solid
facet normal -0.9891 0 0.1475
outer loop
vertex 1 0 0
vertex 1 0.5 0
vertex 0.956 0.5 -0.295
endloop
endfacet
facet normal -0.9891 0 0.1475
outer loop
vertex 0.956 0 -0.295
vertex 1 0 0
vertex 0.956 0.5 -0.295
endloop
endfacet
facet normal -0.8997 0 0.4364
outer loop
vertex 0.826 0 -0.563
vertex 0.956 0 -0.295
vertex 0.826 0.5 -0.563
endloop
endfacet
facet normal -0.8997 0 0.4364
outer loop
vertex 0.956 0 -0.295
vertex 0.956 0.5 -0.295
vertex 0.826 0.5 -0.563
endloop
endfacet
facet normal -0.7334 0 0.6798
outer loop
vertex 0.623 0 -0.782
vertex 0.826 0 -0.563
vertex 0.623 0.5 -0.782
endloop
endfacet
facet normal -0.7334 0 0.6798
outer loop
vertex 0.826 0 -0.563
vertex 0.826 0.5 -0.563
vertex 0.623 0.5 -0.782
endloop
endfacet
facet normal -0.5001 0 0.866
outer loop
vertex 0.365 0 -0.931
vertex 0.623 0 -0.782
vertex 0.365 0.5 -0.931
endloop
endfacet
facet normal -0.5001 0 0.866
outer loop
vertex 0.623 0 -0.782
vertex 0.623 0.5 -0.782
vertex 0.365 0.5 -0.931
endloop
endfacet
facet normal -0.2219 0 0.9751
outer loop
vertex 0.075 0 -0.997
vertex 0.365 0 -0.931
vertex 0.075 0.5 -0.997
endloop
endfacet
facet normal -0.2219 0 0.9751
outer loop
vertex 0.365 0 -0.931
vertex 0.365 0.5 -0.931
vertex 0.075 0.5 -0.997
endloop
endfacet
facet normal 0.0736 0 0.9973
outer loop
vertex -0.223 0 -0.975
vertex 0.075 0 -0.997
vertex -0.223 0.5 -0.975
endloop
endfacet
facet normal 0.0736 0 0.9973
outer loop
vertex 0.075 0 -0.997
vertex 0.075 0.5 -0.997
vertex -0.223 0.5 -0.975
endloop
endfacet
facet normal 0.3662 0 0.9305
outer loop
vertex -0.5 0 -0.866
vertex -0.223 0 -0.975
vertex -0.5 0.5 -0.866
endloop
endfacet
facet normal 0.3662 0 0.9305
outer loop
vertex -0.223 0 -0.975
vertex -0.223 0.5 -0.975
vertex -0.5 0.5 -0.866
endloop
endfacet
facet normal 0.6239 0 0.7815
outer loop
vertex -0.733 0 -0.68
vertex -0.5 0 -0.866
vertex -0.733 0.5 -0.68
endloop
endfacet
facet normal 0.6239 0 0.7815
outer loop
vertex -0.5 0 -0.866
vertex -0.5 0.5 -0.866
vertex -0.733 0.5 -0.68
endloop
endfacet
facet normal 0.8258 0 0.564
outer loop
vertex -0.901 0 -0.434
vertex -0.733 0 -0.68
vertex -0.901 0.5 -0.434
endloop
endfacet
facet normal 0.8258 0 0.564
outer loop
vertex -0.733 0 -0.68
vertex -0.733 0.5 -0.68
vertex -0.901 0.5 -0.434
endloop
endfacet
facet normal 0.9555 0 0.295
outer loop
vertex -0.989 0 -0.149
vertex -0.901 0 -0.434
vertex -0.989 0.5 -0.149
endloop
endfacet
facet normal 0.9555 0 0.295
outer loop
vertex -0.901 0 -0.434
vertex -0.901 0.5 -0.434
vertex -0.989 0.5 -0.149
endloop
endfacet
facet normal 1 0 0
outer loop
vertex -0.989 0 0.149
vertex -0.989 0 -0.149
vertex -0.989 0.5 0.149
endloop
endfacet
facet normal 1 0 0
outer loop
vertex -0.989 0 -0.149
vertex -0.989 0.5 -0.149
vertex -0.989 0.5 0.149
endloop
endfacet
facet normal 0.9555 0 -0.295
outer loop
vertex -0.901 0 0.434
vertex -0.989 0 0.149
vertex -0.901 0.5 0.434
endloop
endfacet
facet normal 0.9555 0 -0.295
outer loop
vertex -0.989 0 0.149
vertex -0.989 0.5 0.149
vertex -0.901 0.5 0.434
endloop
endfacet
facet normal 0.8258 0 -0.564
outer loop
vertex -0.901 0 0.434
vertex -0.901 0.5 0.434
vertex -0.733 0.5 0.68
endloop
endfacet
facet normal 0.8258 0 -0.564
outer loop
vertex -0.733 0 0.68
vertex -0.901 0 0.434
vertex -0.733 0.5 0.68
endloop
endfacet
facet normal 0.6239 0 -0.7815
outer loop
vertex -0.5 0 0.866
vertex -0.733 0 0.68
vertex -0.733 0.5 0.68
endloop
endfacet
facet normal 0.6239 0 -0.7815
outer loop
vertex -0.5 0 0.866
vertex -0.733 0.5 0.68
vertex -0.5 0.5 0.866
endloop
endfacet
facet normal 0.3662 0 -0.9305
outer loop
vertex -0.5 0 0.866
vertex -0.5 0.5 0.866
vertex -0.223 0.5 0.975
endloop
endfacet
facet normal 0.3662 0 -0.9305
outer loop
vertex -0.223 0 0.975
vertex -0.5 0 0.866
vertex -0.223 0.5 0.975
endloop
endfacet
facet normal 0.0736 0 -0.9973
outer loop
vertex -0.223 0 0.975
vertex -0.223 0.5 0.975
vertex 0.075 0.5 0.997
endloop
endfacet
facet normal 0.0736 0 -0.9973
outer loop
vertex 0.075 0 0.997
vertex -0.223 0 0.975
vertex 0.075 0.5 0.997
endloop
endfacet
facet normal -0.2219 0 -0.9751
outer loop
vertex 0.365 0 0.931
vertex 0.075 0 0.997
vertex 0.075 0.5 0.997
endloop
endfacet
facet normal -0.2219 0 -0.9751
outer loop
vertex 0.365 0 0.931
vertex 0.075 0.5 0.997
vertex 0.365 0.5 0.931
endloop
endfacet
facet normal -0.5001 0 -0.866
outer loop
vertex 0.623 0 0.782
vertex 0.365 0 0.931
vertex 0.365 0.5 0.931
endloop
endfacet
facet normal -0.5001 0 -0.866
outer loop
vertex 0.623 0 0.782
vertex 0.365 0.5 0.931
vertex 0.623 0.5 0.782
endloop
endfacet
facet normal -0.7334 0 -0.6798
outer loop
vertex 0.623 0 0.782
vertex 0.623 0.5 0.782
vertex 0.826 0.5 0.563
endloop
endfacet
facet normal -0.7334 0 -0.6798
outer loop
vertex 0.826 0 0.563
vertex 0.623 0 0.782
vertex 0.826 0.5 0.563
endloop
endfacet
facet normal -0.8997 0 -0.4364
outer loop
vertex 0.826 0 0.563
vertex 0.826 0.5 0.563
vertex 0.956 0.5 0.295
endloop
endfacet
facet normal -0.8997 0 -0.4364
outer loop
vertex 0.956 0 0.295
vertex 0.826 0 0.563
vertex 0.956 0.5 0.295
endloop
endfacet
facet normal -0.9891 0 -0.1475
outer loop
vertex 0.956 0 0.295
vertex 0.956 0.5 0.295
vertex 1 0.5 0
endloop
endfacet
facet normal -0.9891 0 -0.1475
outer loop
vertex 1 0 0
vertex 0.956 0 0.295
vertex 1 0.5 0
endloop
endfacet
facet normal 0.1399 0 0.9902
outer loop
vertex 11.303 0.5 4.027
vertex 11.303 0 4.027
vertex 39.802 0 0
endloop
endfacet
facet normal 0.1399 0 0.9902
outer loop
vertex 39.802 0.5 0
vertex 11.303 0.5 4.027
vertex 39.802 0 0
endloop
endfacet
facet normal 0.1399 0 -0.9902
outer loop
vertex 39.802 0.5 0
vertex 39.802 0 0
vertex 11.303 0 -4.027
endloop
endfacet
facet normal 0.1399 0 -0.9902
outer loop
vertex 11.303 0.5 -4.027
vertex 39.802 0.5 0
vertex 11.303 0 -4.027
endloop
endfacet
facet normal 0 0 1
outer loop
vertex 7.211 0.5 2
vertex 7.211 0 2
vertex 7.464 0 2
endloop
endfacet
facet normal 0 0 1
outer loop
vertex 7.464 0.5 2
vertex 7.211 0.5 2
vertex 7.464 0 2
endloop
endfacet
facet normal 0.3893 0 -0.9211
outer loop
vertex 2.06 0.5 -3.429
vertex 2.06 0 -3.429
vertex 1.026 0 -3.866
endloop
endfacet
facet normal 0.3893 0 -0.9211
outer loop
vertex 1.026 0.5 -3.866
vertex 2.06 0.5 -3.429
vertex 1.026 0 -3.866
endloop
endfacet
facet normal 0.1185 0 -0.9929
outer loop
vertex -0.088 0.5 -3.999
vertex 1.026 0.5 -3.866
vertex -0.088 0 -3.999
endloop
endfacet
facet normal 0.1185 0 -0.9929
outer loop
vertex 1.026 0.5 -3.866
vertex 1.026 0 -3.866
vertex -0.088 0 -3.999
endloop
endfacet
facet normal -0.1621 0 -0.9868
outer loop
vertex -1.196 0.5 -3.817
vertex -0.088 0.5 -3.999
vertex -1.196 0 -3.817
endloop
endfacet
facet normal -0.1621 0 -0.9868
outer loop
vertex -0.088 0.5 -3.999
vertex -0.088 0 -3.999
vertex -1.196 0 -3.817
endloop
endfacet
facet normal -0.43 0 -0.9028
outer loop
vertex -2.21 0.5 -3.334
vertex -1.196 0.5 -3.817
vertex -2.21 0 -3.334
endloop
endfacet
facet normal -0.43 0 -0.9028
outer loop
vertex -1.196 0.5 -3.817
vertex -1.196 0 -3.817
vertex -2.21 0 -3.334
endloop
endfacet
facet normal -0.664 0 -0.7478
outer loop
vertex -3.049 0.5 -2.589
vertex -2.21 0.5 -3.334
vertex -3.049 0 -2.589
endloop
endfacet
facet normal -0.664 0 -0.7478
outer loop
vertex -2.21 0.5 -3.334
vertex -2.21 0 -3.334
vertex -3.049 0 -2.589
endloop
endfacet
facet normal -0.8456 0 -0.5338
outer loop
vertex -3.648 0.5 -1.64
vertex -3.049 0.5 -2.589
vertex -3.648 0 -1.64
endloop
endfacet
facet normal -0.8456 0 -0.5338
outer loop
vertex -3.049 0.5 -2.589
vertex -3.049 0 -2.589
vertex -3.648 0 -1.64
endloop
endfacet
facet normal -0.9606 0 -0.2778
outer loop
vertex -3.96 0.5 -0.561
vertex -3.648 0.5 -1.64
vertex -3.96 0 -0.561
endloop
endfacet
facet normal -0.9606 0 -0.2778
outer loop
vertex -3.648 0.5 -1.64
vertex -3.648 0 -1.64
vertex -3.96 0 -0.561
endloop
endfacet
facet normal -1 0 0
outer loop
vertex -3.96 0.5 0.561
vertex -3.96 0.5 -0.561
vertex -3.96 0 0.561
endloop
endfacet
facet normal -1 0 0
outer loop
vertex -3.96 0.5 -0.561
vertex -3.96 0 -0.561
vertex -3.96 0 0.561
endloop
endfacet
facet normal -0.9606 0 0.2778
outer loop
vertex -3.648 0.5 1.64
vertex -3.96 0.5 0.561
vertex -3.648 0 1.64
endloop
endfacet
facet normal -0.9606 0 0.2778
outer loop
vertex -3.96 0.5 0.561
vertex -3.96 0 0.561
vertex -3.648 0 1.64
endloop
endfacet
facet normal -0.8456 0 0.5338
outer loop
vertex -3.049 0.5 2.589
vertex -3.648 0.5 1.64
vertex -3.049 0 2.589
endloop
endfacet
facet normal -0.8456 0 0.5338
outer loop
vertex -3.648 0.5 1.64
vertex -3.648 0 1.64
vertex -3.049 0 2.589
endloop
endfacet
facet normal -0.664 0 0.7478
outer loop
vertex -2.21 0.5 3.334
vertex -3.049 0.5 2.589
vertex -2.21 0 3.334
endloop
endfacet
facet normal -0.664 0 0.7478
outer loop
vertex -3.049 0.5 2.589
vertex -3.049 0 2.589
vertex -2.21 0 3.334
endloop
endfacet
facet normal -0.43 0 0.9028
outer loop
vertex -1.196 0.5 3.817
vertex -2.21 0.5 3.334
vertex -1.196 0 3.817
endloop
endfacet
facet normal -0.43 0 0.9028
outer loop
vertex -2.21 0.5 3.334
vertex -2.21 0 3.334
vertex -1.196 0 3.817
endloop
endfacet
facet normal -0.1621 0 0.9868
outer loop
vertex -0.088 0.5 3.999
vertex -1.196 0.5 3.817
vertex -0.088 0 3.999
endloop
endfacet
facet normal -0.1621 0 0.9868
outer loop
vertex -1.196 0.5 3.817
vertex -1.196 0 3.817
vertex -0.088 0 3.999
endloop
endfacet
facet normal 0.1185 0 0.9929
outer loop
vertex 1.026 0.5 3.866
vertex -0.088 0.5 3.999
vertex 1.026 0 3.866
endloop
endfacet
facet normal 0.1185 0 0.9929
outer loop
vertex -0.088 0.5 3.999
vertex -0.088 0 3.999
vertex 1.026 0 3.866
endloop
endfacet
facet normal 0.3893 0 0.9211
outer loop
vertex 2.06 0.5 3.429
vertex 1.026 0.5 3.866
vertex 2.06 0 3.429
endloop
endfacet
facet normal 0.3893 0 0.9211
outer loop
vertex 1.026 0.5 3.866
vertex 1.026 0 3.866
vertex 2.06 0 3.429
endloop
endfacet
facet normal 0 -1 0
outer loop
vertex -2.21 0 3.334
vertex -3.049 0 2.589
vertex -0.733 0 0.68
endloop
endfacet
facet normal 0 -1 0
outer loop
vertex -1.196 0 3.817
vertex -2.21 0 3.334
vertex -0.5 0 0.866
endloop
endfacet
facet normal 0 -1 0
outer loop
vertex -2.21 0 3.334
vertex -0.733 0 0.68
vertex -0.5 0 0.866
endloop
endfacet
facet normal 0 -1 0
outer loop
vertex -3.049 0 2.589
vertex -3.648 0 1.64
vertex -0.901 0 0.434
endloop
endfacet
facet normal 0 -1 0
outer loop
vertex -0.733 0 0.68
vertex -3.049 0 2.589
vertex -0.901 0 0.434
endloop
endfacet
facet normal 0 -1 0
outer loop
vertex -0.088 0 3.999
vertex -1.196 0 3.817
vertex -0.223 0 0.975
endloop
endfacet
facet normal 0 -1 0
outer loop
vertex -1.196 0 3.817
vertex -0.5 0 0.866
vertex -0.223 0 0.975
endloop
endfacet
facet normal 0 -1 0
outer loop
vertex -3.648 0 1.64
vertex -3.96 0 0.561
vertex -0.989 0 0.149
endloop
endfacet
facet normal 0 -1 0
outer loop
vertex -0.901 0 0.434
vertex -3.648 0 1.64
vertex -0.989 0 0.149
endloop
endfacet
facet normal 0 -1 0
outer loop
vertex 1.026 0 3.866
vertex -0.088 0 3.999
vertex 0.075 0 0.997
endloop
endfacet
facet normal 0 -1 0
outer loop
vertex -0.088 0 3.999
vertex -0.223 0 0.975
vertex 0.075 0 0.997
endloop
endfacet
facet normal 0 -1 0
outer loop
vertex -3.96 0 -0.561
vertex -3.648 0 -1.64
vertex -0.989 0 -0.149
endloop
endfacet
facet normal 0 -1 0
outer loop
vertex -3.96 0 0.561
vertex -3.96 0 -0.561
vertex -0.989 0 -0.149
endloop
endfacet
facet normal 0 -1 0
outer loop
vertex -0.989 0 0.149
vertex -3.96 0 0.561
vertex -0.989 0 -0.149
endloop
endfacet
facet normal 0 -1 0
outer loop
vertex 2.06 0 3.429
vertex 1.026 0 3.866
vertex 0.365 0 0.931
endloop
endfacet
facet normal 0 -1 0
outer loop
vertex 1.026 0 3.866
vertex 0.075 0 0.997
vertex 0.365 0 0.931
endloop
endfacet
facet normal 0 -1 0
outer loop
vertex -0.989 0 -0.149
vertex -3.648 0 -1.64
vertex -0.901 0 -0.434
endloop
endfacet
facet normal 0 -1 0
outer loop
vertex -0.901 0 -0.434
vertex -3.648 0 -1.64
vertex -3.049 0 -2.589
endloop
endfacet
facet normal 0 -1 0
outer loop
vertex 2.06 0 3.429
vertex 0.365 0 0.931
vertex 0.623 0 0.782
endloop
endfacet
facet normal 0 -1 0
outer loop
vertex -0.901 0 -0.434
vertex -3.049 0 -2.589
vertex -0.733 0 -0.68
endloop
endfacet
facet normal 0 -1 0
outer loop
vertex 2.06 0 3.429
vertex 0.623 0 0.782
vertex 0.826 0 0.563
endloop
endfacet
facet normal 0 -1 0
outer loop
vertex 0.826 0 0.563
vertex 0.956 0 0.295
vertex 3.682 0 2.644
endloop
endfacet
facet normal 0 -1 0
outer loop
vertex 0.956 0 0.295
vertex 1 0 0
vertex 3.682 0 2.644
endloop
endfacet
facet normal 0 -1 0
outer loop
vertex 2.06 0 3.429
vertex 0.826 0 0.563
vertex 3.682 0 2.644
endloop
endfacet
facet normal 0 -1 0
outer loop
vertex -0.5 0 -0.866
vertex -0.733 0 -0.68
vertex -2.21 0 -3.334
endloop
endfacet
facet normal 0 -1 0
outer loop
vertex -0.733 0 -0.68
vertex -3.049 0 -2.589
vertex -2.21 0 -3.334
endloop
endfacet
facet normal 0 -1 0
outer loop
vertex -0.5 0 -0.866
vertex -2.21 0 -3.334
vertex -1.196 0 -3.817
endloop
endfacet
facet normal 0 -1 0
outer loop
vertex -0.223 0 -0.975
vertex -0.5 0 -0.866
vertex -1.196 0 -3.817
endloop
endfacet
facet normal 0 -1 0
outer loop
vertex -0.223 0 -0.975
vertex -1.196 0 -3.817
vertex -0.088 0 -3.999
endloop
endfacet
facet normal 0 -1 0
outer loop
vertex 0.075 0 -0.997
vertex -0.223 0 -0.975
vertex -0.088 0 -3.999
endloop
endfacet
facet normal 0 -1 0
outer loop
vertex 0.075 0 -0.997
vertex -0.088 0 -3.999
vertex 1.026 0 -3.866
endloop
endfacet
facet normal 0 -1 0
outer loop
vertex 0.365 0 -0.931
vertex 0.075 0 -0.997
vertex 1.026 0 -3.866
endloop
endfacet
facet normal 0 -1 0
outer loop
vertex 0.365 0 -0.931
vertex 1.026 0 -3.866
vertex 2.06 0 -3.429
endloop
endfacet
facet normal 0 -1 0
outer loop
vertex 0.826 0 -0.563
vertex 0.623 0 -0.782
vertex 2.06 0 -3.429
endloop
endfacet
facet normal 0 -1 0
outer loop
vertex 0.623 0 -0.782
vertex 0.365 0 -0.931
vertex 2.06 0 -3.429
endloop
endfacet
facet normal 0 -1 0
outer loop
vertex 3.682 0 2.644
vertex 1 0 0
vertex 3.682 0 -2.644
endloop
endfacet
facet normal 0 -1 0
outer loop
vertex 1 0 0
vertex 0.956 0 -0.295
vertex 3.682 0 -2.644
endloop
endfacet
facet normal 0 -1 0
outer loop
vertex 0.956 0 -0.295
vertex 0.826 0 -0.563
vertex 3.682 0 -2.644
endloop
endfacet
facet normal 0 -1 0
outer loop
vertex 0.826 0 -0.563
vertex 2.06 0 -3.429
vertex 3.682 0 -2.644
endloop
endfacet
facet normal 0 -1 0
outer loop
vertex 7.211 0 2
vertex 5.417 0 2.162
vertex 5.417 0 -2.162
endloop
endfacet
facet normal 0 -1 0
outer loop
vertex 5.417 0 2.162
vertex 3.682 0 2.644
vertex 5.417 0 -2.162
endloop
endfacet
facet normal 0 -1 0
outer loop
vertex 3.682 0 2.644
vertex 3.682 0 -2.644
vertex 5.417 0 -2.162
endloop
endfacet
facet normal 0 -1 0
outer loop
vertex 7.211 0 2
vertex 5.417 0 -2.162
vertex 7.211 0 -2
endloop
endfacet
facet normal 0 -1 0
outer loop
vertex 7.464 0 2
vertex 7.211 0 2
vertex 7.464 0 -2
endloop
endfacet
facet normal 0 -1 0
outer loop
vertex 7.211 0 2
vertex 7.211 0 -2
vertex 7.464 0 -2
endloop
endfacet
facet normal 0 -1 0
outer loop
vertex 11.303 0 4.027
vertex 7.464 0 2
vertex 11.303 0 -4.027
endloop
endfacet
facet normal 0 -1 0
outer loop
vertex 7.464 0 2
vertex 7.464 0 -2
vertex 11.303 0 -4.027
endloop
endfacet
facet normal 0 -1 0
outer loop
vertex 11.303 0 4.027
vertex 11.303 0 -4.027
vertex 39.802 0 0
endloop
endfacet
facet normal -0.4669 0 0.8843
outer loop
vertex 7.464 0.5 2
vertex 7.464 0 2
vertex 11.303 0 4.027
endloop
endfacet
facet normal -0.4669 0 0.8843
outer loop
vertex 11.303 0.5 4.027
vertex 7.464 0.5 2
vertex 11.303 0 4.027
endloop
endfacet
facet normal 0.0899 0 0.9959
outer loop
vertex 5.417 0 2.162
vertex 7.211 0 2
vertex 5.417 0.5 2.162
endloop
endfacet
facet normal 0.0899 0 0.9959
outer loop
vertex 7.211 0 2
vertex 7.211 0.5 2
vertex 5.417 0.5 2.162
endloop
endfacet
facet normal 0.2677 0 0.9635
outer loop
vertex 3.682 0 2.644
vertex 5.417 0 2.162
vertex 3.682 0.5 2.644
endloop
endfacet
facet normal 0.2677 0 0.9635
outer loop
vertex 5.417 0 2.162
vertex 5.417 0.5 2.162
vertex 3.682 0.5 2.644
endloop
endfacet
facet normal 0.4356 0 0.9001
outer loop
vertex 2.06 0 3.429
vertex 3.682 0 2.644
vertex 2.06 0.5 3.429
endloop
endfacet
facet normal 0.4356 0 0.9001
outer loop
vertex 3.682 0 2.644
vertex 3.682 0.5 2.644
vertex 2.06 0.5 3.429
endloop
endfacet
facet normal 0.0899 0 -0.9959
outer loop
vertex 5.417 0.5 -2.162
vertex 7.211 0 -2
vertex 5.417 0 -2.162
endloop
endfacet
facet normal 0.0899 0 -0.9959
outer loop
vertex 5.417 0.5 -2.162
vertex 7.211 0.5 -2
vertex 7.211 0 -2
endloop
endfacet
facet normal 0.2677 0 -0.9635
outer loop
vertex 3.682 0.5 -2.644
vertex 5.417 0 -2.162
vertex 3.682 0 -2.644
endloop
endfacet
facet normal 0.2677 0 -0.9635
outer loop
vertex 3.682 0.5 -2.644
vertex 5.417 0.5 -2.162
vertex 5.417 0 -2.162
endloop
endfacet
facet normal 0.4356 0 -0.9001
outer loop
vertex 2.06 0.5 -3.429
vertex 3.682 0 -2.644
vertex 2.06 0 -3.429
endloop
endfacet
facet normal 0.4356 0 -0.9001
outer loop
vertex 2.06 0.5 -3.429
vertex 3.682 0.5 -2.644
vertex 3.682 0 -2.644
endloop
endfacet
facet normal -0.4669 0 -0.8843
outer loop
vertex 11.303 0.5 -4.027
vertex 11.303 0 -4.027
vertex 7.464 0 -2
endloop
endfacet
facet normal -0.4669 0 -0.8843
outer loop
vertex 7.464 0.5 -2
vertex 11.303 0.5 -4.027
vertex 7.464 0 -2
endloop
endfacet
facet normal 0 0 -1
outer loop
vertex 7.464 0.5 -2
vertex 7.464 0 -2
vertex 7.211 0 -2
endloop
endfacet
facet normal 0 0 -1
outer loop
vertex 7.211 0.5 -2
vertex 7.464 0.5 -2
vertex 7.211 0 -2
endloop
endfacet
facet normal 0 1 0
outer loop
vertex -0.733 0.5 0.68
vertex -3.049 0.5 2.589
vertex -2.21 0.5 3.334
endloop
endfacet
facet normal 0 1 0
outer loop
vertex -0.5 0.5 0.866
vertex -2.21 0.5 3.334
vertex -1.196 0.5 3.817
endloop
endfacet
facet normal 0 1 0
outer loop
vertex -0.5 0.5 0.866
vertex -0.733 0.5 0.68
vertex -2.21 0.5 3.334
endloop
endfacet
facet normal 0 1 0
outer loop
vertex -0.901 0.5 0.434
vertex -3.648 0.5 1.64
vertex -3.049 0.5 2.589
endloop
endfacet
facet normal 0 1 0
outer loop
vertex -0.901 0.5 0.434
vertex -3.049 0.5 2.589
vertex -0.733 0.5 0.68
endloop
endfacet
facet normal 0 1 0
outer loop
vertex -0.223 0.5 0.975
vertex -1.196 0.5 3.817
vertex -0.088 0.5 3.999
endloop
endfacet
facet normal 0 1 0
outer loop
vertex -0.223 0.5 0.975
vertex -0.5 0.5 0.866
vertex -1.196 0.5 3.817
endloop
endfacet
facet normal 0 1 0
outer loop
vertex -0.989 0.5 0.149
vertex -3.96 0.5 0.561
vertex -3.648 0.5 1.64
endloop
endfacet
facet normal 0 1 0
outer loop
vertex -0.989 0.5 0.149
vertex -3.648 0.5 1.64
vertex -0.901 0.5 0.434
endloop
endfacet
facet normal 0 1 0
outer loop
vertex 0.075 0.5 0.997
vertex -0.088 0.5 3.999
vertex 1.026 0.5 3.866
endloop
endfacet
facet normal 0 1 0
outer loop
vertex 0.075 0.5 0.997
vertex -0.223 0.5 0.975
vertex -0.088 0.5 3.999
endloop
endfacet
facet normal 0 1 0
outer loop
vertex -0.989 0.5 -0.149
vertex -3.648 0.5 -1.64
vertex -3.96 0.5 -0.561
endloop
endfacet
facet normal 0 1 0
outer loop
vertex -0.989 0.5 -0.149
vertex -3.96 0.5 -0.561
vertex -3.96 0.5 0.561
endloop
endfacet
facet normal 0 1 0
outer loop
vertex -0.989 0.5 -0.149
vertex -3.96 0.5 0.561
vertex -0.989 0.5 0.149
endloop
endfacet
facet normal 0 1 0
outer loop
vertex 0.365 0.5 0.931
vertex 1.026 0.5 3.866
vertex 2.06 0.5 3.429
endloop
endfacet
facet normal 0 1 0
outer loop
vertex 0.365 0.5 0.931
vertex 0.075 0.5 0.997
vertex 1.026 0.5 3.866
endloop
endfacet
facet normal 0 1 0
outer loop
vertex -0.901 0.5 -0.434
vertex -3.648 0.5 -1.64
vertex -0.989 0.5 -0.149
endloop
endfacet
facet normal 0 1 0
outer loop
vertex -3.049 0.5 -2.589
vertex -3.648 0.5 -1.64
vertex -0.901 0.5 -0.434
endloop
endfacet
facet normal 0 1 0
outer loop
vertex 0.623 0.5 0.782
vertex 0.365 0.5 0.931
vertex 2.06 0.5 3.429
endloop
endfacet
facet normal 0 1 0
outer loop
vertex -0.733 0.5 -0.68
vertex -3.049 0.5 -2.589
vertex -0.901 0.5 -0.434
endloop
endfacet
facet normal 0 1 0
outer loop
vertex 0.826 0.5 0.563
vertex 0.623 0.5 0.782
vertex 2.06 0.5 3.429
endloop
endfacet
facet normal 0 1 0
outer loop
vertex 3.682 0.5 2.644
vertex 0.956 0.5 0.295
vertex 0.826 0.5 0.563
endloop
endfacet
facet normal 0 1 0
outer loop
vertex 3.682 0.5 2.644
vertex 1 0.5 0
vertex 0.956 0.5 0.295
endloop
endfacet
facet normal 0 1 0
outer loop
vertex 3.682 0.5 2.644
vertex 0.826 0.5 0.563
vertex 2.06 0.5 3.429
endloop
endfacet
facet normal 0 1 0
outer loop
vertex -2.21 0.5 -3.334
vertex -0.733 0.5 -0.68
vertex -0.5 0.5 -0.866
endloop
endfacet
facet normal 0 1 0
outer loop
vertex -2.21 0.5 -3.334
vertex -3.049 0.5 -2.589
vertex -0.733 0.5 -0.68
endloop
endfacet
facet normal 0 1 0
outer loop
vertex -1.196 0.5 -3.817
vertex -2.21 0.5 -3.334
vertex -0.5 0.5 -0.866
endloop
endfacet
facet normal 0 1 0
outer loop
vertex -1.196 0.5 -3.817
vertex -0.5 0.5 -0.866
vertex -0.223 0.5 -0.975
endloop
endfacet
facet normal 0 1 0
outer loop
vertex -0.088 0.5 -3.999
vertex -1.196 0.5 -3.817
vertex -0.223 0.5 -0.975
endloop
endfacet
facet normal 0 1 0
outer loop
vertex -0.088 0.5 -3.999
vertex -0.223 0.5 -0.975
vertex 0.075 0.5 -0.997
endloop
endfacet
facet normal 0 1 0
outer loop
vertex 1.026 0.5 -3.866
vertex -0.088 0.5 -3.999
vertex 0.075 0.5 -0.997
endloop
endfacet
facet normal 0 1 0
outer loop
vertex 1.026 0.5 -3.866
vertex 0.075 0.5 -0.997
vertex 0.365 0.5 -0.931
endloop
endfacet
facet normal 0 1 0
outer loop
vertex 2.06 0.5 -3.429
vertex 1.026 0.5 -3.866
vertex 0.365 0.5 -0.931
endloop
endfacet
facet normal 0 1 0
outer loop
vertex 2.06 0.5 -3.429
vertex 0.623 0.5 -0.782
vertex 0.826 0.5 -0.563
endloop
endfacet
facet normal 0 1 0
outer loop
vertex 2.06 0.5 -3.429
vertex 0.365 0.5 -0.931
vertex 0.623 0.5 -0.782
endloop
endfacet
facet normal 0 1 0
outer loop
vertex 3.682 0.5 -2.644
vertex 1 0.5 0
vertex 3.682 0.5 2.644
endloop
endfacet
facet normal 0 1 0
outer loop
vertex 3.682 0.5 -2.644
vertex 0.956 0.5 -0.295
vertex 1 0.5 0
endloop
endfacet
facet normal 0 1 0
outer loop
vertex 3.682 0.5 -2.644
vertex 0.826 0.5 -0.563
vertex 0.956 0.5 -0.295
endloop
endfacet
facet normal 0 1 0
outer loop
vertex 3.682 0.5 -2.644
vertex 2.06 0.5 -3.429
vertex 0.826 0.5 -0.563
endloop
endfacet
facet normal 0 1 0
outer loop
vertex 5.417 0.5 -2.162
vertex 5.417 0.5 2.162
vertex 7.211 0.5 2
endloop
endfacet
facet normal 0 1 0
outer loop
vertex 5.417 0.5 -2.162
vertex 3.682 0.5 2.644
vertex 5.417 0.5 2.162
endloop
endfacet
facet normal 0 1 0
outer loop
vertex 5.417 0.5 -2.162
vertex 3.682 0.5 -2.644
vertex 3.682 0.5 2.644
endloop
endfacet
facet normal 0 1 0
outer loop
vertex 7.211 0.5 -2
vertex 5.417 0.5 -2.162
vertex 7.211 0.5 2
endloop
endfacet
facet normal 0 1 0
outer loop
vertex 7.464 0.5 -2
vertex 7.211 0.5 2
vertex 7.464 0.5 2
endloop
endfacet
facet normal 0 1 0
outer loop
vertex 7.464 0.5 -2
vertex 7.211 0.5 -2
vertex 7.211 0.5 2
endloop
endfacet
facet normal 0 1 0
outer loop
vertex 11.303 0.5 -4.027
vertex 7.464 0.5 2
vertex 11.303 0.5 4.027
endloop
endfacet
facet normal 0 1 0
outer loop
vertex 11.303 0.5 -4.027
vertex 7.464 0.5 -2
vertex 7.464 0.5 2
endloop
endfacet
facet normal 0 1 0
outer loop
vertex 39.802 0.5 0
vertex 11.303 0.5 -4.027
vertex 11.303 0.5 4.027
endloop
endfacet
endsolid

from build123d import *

# Parameters (mm, degrees)
BOSS_EXTRUDE2_DEPTH = 0.5
SKETCH3_R           = 1
CUT_EXTRUDE2_DEPTH  = 1.5
FILLET1_R           = 10


with BuildPart() as part:
    # Sketch1 → Boss-Extrude2 (new body)
    with BuildSketch(Plane(origin=(0, 0, 0), x_dir=(1, 0, 0), z_dir=(0, 1, 0))):
        with BuildLine():
            Line((39.801772908, 0), (11.302617333, 4.027174803))
            Line((11.302617333, 4.027174803), (7.464101615, 2))
            Line((7.464101615, 2), (3.464101615, 2))
            ThreePointArc((3.464101615, 2), (-4, 0), (3.464101615, -2))
            Line((3.464101615, -2), (7.464101615, -2))
            Line((7.464101615, -2), (11.302617333, -4.027174803))
            Line((11.302617333, -4.027174803), (39.801772908, 0))
        make_face()
    extrude(amount=BOSS_EXTRUDE2_DEPTH)

    # Sketch3 → Cut-Extrude2 (cut, through all)
    with BuildSketch(Plane(origin=(0, 0.5, 0), x_dir=(1, 0, 0), z_dir=(0, 1, 0))):
        Circle(SKETCH3_R)
    extrude(amount=-CUT_EXTRUDE2_DEPTH, mode=Mode.SUBTRACT)

    # Fillet1
    fillet1_edges = [part.edges().sort_by_distance(p)[0] for p in [
        (3.464101615, 0.25, 2),
        (3.464101615, 0.25, -2),
    ]]
    fillet(fillet1_edges, radius=FILLET1_R)


solid = part.part
